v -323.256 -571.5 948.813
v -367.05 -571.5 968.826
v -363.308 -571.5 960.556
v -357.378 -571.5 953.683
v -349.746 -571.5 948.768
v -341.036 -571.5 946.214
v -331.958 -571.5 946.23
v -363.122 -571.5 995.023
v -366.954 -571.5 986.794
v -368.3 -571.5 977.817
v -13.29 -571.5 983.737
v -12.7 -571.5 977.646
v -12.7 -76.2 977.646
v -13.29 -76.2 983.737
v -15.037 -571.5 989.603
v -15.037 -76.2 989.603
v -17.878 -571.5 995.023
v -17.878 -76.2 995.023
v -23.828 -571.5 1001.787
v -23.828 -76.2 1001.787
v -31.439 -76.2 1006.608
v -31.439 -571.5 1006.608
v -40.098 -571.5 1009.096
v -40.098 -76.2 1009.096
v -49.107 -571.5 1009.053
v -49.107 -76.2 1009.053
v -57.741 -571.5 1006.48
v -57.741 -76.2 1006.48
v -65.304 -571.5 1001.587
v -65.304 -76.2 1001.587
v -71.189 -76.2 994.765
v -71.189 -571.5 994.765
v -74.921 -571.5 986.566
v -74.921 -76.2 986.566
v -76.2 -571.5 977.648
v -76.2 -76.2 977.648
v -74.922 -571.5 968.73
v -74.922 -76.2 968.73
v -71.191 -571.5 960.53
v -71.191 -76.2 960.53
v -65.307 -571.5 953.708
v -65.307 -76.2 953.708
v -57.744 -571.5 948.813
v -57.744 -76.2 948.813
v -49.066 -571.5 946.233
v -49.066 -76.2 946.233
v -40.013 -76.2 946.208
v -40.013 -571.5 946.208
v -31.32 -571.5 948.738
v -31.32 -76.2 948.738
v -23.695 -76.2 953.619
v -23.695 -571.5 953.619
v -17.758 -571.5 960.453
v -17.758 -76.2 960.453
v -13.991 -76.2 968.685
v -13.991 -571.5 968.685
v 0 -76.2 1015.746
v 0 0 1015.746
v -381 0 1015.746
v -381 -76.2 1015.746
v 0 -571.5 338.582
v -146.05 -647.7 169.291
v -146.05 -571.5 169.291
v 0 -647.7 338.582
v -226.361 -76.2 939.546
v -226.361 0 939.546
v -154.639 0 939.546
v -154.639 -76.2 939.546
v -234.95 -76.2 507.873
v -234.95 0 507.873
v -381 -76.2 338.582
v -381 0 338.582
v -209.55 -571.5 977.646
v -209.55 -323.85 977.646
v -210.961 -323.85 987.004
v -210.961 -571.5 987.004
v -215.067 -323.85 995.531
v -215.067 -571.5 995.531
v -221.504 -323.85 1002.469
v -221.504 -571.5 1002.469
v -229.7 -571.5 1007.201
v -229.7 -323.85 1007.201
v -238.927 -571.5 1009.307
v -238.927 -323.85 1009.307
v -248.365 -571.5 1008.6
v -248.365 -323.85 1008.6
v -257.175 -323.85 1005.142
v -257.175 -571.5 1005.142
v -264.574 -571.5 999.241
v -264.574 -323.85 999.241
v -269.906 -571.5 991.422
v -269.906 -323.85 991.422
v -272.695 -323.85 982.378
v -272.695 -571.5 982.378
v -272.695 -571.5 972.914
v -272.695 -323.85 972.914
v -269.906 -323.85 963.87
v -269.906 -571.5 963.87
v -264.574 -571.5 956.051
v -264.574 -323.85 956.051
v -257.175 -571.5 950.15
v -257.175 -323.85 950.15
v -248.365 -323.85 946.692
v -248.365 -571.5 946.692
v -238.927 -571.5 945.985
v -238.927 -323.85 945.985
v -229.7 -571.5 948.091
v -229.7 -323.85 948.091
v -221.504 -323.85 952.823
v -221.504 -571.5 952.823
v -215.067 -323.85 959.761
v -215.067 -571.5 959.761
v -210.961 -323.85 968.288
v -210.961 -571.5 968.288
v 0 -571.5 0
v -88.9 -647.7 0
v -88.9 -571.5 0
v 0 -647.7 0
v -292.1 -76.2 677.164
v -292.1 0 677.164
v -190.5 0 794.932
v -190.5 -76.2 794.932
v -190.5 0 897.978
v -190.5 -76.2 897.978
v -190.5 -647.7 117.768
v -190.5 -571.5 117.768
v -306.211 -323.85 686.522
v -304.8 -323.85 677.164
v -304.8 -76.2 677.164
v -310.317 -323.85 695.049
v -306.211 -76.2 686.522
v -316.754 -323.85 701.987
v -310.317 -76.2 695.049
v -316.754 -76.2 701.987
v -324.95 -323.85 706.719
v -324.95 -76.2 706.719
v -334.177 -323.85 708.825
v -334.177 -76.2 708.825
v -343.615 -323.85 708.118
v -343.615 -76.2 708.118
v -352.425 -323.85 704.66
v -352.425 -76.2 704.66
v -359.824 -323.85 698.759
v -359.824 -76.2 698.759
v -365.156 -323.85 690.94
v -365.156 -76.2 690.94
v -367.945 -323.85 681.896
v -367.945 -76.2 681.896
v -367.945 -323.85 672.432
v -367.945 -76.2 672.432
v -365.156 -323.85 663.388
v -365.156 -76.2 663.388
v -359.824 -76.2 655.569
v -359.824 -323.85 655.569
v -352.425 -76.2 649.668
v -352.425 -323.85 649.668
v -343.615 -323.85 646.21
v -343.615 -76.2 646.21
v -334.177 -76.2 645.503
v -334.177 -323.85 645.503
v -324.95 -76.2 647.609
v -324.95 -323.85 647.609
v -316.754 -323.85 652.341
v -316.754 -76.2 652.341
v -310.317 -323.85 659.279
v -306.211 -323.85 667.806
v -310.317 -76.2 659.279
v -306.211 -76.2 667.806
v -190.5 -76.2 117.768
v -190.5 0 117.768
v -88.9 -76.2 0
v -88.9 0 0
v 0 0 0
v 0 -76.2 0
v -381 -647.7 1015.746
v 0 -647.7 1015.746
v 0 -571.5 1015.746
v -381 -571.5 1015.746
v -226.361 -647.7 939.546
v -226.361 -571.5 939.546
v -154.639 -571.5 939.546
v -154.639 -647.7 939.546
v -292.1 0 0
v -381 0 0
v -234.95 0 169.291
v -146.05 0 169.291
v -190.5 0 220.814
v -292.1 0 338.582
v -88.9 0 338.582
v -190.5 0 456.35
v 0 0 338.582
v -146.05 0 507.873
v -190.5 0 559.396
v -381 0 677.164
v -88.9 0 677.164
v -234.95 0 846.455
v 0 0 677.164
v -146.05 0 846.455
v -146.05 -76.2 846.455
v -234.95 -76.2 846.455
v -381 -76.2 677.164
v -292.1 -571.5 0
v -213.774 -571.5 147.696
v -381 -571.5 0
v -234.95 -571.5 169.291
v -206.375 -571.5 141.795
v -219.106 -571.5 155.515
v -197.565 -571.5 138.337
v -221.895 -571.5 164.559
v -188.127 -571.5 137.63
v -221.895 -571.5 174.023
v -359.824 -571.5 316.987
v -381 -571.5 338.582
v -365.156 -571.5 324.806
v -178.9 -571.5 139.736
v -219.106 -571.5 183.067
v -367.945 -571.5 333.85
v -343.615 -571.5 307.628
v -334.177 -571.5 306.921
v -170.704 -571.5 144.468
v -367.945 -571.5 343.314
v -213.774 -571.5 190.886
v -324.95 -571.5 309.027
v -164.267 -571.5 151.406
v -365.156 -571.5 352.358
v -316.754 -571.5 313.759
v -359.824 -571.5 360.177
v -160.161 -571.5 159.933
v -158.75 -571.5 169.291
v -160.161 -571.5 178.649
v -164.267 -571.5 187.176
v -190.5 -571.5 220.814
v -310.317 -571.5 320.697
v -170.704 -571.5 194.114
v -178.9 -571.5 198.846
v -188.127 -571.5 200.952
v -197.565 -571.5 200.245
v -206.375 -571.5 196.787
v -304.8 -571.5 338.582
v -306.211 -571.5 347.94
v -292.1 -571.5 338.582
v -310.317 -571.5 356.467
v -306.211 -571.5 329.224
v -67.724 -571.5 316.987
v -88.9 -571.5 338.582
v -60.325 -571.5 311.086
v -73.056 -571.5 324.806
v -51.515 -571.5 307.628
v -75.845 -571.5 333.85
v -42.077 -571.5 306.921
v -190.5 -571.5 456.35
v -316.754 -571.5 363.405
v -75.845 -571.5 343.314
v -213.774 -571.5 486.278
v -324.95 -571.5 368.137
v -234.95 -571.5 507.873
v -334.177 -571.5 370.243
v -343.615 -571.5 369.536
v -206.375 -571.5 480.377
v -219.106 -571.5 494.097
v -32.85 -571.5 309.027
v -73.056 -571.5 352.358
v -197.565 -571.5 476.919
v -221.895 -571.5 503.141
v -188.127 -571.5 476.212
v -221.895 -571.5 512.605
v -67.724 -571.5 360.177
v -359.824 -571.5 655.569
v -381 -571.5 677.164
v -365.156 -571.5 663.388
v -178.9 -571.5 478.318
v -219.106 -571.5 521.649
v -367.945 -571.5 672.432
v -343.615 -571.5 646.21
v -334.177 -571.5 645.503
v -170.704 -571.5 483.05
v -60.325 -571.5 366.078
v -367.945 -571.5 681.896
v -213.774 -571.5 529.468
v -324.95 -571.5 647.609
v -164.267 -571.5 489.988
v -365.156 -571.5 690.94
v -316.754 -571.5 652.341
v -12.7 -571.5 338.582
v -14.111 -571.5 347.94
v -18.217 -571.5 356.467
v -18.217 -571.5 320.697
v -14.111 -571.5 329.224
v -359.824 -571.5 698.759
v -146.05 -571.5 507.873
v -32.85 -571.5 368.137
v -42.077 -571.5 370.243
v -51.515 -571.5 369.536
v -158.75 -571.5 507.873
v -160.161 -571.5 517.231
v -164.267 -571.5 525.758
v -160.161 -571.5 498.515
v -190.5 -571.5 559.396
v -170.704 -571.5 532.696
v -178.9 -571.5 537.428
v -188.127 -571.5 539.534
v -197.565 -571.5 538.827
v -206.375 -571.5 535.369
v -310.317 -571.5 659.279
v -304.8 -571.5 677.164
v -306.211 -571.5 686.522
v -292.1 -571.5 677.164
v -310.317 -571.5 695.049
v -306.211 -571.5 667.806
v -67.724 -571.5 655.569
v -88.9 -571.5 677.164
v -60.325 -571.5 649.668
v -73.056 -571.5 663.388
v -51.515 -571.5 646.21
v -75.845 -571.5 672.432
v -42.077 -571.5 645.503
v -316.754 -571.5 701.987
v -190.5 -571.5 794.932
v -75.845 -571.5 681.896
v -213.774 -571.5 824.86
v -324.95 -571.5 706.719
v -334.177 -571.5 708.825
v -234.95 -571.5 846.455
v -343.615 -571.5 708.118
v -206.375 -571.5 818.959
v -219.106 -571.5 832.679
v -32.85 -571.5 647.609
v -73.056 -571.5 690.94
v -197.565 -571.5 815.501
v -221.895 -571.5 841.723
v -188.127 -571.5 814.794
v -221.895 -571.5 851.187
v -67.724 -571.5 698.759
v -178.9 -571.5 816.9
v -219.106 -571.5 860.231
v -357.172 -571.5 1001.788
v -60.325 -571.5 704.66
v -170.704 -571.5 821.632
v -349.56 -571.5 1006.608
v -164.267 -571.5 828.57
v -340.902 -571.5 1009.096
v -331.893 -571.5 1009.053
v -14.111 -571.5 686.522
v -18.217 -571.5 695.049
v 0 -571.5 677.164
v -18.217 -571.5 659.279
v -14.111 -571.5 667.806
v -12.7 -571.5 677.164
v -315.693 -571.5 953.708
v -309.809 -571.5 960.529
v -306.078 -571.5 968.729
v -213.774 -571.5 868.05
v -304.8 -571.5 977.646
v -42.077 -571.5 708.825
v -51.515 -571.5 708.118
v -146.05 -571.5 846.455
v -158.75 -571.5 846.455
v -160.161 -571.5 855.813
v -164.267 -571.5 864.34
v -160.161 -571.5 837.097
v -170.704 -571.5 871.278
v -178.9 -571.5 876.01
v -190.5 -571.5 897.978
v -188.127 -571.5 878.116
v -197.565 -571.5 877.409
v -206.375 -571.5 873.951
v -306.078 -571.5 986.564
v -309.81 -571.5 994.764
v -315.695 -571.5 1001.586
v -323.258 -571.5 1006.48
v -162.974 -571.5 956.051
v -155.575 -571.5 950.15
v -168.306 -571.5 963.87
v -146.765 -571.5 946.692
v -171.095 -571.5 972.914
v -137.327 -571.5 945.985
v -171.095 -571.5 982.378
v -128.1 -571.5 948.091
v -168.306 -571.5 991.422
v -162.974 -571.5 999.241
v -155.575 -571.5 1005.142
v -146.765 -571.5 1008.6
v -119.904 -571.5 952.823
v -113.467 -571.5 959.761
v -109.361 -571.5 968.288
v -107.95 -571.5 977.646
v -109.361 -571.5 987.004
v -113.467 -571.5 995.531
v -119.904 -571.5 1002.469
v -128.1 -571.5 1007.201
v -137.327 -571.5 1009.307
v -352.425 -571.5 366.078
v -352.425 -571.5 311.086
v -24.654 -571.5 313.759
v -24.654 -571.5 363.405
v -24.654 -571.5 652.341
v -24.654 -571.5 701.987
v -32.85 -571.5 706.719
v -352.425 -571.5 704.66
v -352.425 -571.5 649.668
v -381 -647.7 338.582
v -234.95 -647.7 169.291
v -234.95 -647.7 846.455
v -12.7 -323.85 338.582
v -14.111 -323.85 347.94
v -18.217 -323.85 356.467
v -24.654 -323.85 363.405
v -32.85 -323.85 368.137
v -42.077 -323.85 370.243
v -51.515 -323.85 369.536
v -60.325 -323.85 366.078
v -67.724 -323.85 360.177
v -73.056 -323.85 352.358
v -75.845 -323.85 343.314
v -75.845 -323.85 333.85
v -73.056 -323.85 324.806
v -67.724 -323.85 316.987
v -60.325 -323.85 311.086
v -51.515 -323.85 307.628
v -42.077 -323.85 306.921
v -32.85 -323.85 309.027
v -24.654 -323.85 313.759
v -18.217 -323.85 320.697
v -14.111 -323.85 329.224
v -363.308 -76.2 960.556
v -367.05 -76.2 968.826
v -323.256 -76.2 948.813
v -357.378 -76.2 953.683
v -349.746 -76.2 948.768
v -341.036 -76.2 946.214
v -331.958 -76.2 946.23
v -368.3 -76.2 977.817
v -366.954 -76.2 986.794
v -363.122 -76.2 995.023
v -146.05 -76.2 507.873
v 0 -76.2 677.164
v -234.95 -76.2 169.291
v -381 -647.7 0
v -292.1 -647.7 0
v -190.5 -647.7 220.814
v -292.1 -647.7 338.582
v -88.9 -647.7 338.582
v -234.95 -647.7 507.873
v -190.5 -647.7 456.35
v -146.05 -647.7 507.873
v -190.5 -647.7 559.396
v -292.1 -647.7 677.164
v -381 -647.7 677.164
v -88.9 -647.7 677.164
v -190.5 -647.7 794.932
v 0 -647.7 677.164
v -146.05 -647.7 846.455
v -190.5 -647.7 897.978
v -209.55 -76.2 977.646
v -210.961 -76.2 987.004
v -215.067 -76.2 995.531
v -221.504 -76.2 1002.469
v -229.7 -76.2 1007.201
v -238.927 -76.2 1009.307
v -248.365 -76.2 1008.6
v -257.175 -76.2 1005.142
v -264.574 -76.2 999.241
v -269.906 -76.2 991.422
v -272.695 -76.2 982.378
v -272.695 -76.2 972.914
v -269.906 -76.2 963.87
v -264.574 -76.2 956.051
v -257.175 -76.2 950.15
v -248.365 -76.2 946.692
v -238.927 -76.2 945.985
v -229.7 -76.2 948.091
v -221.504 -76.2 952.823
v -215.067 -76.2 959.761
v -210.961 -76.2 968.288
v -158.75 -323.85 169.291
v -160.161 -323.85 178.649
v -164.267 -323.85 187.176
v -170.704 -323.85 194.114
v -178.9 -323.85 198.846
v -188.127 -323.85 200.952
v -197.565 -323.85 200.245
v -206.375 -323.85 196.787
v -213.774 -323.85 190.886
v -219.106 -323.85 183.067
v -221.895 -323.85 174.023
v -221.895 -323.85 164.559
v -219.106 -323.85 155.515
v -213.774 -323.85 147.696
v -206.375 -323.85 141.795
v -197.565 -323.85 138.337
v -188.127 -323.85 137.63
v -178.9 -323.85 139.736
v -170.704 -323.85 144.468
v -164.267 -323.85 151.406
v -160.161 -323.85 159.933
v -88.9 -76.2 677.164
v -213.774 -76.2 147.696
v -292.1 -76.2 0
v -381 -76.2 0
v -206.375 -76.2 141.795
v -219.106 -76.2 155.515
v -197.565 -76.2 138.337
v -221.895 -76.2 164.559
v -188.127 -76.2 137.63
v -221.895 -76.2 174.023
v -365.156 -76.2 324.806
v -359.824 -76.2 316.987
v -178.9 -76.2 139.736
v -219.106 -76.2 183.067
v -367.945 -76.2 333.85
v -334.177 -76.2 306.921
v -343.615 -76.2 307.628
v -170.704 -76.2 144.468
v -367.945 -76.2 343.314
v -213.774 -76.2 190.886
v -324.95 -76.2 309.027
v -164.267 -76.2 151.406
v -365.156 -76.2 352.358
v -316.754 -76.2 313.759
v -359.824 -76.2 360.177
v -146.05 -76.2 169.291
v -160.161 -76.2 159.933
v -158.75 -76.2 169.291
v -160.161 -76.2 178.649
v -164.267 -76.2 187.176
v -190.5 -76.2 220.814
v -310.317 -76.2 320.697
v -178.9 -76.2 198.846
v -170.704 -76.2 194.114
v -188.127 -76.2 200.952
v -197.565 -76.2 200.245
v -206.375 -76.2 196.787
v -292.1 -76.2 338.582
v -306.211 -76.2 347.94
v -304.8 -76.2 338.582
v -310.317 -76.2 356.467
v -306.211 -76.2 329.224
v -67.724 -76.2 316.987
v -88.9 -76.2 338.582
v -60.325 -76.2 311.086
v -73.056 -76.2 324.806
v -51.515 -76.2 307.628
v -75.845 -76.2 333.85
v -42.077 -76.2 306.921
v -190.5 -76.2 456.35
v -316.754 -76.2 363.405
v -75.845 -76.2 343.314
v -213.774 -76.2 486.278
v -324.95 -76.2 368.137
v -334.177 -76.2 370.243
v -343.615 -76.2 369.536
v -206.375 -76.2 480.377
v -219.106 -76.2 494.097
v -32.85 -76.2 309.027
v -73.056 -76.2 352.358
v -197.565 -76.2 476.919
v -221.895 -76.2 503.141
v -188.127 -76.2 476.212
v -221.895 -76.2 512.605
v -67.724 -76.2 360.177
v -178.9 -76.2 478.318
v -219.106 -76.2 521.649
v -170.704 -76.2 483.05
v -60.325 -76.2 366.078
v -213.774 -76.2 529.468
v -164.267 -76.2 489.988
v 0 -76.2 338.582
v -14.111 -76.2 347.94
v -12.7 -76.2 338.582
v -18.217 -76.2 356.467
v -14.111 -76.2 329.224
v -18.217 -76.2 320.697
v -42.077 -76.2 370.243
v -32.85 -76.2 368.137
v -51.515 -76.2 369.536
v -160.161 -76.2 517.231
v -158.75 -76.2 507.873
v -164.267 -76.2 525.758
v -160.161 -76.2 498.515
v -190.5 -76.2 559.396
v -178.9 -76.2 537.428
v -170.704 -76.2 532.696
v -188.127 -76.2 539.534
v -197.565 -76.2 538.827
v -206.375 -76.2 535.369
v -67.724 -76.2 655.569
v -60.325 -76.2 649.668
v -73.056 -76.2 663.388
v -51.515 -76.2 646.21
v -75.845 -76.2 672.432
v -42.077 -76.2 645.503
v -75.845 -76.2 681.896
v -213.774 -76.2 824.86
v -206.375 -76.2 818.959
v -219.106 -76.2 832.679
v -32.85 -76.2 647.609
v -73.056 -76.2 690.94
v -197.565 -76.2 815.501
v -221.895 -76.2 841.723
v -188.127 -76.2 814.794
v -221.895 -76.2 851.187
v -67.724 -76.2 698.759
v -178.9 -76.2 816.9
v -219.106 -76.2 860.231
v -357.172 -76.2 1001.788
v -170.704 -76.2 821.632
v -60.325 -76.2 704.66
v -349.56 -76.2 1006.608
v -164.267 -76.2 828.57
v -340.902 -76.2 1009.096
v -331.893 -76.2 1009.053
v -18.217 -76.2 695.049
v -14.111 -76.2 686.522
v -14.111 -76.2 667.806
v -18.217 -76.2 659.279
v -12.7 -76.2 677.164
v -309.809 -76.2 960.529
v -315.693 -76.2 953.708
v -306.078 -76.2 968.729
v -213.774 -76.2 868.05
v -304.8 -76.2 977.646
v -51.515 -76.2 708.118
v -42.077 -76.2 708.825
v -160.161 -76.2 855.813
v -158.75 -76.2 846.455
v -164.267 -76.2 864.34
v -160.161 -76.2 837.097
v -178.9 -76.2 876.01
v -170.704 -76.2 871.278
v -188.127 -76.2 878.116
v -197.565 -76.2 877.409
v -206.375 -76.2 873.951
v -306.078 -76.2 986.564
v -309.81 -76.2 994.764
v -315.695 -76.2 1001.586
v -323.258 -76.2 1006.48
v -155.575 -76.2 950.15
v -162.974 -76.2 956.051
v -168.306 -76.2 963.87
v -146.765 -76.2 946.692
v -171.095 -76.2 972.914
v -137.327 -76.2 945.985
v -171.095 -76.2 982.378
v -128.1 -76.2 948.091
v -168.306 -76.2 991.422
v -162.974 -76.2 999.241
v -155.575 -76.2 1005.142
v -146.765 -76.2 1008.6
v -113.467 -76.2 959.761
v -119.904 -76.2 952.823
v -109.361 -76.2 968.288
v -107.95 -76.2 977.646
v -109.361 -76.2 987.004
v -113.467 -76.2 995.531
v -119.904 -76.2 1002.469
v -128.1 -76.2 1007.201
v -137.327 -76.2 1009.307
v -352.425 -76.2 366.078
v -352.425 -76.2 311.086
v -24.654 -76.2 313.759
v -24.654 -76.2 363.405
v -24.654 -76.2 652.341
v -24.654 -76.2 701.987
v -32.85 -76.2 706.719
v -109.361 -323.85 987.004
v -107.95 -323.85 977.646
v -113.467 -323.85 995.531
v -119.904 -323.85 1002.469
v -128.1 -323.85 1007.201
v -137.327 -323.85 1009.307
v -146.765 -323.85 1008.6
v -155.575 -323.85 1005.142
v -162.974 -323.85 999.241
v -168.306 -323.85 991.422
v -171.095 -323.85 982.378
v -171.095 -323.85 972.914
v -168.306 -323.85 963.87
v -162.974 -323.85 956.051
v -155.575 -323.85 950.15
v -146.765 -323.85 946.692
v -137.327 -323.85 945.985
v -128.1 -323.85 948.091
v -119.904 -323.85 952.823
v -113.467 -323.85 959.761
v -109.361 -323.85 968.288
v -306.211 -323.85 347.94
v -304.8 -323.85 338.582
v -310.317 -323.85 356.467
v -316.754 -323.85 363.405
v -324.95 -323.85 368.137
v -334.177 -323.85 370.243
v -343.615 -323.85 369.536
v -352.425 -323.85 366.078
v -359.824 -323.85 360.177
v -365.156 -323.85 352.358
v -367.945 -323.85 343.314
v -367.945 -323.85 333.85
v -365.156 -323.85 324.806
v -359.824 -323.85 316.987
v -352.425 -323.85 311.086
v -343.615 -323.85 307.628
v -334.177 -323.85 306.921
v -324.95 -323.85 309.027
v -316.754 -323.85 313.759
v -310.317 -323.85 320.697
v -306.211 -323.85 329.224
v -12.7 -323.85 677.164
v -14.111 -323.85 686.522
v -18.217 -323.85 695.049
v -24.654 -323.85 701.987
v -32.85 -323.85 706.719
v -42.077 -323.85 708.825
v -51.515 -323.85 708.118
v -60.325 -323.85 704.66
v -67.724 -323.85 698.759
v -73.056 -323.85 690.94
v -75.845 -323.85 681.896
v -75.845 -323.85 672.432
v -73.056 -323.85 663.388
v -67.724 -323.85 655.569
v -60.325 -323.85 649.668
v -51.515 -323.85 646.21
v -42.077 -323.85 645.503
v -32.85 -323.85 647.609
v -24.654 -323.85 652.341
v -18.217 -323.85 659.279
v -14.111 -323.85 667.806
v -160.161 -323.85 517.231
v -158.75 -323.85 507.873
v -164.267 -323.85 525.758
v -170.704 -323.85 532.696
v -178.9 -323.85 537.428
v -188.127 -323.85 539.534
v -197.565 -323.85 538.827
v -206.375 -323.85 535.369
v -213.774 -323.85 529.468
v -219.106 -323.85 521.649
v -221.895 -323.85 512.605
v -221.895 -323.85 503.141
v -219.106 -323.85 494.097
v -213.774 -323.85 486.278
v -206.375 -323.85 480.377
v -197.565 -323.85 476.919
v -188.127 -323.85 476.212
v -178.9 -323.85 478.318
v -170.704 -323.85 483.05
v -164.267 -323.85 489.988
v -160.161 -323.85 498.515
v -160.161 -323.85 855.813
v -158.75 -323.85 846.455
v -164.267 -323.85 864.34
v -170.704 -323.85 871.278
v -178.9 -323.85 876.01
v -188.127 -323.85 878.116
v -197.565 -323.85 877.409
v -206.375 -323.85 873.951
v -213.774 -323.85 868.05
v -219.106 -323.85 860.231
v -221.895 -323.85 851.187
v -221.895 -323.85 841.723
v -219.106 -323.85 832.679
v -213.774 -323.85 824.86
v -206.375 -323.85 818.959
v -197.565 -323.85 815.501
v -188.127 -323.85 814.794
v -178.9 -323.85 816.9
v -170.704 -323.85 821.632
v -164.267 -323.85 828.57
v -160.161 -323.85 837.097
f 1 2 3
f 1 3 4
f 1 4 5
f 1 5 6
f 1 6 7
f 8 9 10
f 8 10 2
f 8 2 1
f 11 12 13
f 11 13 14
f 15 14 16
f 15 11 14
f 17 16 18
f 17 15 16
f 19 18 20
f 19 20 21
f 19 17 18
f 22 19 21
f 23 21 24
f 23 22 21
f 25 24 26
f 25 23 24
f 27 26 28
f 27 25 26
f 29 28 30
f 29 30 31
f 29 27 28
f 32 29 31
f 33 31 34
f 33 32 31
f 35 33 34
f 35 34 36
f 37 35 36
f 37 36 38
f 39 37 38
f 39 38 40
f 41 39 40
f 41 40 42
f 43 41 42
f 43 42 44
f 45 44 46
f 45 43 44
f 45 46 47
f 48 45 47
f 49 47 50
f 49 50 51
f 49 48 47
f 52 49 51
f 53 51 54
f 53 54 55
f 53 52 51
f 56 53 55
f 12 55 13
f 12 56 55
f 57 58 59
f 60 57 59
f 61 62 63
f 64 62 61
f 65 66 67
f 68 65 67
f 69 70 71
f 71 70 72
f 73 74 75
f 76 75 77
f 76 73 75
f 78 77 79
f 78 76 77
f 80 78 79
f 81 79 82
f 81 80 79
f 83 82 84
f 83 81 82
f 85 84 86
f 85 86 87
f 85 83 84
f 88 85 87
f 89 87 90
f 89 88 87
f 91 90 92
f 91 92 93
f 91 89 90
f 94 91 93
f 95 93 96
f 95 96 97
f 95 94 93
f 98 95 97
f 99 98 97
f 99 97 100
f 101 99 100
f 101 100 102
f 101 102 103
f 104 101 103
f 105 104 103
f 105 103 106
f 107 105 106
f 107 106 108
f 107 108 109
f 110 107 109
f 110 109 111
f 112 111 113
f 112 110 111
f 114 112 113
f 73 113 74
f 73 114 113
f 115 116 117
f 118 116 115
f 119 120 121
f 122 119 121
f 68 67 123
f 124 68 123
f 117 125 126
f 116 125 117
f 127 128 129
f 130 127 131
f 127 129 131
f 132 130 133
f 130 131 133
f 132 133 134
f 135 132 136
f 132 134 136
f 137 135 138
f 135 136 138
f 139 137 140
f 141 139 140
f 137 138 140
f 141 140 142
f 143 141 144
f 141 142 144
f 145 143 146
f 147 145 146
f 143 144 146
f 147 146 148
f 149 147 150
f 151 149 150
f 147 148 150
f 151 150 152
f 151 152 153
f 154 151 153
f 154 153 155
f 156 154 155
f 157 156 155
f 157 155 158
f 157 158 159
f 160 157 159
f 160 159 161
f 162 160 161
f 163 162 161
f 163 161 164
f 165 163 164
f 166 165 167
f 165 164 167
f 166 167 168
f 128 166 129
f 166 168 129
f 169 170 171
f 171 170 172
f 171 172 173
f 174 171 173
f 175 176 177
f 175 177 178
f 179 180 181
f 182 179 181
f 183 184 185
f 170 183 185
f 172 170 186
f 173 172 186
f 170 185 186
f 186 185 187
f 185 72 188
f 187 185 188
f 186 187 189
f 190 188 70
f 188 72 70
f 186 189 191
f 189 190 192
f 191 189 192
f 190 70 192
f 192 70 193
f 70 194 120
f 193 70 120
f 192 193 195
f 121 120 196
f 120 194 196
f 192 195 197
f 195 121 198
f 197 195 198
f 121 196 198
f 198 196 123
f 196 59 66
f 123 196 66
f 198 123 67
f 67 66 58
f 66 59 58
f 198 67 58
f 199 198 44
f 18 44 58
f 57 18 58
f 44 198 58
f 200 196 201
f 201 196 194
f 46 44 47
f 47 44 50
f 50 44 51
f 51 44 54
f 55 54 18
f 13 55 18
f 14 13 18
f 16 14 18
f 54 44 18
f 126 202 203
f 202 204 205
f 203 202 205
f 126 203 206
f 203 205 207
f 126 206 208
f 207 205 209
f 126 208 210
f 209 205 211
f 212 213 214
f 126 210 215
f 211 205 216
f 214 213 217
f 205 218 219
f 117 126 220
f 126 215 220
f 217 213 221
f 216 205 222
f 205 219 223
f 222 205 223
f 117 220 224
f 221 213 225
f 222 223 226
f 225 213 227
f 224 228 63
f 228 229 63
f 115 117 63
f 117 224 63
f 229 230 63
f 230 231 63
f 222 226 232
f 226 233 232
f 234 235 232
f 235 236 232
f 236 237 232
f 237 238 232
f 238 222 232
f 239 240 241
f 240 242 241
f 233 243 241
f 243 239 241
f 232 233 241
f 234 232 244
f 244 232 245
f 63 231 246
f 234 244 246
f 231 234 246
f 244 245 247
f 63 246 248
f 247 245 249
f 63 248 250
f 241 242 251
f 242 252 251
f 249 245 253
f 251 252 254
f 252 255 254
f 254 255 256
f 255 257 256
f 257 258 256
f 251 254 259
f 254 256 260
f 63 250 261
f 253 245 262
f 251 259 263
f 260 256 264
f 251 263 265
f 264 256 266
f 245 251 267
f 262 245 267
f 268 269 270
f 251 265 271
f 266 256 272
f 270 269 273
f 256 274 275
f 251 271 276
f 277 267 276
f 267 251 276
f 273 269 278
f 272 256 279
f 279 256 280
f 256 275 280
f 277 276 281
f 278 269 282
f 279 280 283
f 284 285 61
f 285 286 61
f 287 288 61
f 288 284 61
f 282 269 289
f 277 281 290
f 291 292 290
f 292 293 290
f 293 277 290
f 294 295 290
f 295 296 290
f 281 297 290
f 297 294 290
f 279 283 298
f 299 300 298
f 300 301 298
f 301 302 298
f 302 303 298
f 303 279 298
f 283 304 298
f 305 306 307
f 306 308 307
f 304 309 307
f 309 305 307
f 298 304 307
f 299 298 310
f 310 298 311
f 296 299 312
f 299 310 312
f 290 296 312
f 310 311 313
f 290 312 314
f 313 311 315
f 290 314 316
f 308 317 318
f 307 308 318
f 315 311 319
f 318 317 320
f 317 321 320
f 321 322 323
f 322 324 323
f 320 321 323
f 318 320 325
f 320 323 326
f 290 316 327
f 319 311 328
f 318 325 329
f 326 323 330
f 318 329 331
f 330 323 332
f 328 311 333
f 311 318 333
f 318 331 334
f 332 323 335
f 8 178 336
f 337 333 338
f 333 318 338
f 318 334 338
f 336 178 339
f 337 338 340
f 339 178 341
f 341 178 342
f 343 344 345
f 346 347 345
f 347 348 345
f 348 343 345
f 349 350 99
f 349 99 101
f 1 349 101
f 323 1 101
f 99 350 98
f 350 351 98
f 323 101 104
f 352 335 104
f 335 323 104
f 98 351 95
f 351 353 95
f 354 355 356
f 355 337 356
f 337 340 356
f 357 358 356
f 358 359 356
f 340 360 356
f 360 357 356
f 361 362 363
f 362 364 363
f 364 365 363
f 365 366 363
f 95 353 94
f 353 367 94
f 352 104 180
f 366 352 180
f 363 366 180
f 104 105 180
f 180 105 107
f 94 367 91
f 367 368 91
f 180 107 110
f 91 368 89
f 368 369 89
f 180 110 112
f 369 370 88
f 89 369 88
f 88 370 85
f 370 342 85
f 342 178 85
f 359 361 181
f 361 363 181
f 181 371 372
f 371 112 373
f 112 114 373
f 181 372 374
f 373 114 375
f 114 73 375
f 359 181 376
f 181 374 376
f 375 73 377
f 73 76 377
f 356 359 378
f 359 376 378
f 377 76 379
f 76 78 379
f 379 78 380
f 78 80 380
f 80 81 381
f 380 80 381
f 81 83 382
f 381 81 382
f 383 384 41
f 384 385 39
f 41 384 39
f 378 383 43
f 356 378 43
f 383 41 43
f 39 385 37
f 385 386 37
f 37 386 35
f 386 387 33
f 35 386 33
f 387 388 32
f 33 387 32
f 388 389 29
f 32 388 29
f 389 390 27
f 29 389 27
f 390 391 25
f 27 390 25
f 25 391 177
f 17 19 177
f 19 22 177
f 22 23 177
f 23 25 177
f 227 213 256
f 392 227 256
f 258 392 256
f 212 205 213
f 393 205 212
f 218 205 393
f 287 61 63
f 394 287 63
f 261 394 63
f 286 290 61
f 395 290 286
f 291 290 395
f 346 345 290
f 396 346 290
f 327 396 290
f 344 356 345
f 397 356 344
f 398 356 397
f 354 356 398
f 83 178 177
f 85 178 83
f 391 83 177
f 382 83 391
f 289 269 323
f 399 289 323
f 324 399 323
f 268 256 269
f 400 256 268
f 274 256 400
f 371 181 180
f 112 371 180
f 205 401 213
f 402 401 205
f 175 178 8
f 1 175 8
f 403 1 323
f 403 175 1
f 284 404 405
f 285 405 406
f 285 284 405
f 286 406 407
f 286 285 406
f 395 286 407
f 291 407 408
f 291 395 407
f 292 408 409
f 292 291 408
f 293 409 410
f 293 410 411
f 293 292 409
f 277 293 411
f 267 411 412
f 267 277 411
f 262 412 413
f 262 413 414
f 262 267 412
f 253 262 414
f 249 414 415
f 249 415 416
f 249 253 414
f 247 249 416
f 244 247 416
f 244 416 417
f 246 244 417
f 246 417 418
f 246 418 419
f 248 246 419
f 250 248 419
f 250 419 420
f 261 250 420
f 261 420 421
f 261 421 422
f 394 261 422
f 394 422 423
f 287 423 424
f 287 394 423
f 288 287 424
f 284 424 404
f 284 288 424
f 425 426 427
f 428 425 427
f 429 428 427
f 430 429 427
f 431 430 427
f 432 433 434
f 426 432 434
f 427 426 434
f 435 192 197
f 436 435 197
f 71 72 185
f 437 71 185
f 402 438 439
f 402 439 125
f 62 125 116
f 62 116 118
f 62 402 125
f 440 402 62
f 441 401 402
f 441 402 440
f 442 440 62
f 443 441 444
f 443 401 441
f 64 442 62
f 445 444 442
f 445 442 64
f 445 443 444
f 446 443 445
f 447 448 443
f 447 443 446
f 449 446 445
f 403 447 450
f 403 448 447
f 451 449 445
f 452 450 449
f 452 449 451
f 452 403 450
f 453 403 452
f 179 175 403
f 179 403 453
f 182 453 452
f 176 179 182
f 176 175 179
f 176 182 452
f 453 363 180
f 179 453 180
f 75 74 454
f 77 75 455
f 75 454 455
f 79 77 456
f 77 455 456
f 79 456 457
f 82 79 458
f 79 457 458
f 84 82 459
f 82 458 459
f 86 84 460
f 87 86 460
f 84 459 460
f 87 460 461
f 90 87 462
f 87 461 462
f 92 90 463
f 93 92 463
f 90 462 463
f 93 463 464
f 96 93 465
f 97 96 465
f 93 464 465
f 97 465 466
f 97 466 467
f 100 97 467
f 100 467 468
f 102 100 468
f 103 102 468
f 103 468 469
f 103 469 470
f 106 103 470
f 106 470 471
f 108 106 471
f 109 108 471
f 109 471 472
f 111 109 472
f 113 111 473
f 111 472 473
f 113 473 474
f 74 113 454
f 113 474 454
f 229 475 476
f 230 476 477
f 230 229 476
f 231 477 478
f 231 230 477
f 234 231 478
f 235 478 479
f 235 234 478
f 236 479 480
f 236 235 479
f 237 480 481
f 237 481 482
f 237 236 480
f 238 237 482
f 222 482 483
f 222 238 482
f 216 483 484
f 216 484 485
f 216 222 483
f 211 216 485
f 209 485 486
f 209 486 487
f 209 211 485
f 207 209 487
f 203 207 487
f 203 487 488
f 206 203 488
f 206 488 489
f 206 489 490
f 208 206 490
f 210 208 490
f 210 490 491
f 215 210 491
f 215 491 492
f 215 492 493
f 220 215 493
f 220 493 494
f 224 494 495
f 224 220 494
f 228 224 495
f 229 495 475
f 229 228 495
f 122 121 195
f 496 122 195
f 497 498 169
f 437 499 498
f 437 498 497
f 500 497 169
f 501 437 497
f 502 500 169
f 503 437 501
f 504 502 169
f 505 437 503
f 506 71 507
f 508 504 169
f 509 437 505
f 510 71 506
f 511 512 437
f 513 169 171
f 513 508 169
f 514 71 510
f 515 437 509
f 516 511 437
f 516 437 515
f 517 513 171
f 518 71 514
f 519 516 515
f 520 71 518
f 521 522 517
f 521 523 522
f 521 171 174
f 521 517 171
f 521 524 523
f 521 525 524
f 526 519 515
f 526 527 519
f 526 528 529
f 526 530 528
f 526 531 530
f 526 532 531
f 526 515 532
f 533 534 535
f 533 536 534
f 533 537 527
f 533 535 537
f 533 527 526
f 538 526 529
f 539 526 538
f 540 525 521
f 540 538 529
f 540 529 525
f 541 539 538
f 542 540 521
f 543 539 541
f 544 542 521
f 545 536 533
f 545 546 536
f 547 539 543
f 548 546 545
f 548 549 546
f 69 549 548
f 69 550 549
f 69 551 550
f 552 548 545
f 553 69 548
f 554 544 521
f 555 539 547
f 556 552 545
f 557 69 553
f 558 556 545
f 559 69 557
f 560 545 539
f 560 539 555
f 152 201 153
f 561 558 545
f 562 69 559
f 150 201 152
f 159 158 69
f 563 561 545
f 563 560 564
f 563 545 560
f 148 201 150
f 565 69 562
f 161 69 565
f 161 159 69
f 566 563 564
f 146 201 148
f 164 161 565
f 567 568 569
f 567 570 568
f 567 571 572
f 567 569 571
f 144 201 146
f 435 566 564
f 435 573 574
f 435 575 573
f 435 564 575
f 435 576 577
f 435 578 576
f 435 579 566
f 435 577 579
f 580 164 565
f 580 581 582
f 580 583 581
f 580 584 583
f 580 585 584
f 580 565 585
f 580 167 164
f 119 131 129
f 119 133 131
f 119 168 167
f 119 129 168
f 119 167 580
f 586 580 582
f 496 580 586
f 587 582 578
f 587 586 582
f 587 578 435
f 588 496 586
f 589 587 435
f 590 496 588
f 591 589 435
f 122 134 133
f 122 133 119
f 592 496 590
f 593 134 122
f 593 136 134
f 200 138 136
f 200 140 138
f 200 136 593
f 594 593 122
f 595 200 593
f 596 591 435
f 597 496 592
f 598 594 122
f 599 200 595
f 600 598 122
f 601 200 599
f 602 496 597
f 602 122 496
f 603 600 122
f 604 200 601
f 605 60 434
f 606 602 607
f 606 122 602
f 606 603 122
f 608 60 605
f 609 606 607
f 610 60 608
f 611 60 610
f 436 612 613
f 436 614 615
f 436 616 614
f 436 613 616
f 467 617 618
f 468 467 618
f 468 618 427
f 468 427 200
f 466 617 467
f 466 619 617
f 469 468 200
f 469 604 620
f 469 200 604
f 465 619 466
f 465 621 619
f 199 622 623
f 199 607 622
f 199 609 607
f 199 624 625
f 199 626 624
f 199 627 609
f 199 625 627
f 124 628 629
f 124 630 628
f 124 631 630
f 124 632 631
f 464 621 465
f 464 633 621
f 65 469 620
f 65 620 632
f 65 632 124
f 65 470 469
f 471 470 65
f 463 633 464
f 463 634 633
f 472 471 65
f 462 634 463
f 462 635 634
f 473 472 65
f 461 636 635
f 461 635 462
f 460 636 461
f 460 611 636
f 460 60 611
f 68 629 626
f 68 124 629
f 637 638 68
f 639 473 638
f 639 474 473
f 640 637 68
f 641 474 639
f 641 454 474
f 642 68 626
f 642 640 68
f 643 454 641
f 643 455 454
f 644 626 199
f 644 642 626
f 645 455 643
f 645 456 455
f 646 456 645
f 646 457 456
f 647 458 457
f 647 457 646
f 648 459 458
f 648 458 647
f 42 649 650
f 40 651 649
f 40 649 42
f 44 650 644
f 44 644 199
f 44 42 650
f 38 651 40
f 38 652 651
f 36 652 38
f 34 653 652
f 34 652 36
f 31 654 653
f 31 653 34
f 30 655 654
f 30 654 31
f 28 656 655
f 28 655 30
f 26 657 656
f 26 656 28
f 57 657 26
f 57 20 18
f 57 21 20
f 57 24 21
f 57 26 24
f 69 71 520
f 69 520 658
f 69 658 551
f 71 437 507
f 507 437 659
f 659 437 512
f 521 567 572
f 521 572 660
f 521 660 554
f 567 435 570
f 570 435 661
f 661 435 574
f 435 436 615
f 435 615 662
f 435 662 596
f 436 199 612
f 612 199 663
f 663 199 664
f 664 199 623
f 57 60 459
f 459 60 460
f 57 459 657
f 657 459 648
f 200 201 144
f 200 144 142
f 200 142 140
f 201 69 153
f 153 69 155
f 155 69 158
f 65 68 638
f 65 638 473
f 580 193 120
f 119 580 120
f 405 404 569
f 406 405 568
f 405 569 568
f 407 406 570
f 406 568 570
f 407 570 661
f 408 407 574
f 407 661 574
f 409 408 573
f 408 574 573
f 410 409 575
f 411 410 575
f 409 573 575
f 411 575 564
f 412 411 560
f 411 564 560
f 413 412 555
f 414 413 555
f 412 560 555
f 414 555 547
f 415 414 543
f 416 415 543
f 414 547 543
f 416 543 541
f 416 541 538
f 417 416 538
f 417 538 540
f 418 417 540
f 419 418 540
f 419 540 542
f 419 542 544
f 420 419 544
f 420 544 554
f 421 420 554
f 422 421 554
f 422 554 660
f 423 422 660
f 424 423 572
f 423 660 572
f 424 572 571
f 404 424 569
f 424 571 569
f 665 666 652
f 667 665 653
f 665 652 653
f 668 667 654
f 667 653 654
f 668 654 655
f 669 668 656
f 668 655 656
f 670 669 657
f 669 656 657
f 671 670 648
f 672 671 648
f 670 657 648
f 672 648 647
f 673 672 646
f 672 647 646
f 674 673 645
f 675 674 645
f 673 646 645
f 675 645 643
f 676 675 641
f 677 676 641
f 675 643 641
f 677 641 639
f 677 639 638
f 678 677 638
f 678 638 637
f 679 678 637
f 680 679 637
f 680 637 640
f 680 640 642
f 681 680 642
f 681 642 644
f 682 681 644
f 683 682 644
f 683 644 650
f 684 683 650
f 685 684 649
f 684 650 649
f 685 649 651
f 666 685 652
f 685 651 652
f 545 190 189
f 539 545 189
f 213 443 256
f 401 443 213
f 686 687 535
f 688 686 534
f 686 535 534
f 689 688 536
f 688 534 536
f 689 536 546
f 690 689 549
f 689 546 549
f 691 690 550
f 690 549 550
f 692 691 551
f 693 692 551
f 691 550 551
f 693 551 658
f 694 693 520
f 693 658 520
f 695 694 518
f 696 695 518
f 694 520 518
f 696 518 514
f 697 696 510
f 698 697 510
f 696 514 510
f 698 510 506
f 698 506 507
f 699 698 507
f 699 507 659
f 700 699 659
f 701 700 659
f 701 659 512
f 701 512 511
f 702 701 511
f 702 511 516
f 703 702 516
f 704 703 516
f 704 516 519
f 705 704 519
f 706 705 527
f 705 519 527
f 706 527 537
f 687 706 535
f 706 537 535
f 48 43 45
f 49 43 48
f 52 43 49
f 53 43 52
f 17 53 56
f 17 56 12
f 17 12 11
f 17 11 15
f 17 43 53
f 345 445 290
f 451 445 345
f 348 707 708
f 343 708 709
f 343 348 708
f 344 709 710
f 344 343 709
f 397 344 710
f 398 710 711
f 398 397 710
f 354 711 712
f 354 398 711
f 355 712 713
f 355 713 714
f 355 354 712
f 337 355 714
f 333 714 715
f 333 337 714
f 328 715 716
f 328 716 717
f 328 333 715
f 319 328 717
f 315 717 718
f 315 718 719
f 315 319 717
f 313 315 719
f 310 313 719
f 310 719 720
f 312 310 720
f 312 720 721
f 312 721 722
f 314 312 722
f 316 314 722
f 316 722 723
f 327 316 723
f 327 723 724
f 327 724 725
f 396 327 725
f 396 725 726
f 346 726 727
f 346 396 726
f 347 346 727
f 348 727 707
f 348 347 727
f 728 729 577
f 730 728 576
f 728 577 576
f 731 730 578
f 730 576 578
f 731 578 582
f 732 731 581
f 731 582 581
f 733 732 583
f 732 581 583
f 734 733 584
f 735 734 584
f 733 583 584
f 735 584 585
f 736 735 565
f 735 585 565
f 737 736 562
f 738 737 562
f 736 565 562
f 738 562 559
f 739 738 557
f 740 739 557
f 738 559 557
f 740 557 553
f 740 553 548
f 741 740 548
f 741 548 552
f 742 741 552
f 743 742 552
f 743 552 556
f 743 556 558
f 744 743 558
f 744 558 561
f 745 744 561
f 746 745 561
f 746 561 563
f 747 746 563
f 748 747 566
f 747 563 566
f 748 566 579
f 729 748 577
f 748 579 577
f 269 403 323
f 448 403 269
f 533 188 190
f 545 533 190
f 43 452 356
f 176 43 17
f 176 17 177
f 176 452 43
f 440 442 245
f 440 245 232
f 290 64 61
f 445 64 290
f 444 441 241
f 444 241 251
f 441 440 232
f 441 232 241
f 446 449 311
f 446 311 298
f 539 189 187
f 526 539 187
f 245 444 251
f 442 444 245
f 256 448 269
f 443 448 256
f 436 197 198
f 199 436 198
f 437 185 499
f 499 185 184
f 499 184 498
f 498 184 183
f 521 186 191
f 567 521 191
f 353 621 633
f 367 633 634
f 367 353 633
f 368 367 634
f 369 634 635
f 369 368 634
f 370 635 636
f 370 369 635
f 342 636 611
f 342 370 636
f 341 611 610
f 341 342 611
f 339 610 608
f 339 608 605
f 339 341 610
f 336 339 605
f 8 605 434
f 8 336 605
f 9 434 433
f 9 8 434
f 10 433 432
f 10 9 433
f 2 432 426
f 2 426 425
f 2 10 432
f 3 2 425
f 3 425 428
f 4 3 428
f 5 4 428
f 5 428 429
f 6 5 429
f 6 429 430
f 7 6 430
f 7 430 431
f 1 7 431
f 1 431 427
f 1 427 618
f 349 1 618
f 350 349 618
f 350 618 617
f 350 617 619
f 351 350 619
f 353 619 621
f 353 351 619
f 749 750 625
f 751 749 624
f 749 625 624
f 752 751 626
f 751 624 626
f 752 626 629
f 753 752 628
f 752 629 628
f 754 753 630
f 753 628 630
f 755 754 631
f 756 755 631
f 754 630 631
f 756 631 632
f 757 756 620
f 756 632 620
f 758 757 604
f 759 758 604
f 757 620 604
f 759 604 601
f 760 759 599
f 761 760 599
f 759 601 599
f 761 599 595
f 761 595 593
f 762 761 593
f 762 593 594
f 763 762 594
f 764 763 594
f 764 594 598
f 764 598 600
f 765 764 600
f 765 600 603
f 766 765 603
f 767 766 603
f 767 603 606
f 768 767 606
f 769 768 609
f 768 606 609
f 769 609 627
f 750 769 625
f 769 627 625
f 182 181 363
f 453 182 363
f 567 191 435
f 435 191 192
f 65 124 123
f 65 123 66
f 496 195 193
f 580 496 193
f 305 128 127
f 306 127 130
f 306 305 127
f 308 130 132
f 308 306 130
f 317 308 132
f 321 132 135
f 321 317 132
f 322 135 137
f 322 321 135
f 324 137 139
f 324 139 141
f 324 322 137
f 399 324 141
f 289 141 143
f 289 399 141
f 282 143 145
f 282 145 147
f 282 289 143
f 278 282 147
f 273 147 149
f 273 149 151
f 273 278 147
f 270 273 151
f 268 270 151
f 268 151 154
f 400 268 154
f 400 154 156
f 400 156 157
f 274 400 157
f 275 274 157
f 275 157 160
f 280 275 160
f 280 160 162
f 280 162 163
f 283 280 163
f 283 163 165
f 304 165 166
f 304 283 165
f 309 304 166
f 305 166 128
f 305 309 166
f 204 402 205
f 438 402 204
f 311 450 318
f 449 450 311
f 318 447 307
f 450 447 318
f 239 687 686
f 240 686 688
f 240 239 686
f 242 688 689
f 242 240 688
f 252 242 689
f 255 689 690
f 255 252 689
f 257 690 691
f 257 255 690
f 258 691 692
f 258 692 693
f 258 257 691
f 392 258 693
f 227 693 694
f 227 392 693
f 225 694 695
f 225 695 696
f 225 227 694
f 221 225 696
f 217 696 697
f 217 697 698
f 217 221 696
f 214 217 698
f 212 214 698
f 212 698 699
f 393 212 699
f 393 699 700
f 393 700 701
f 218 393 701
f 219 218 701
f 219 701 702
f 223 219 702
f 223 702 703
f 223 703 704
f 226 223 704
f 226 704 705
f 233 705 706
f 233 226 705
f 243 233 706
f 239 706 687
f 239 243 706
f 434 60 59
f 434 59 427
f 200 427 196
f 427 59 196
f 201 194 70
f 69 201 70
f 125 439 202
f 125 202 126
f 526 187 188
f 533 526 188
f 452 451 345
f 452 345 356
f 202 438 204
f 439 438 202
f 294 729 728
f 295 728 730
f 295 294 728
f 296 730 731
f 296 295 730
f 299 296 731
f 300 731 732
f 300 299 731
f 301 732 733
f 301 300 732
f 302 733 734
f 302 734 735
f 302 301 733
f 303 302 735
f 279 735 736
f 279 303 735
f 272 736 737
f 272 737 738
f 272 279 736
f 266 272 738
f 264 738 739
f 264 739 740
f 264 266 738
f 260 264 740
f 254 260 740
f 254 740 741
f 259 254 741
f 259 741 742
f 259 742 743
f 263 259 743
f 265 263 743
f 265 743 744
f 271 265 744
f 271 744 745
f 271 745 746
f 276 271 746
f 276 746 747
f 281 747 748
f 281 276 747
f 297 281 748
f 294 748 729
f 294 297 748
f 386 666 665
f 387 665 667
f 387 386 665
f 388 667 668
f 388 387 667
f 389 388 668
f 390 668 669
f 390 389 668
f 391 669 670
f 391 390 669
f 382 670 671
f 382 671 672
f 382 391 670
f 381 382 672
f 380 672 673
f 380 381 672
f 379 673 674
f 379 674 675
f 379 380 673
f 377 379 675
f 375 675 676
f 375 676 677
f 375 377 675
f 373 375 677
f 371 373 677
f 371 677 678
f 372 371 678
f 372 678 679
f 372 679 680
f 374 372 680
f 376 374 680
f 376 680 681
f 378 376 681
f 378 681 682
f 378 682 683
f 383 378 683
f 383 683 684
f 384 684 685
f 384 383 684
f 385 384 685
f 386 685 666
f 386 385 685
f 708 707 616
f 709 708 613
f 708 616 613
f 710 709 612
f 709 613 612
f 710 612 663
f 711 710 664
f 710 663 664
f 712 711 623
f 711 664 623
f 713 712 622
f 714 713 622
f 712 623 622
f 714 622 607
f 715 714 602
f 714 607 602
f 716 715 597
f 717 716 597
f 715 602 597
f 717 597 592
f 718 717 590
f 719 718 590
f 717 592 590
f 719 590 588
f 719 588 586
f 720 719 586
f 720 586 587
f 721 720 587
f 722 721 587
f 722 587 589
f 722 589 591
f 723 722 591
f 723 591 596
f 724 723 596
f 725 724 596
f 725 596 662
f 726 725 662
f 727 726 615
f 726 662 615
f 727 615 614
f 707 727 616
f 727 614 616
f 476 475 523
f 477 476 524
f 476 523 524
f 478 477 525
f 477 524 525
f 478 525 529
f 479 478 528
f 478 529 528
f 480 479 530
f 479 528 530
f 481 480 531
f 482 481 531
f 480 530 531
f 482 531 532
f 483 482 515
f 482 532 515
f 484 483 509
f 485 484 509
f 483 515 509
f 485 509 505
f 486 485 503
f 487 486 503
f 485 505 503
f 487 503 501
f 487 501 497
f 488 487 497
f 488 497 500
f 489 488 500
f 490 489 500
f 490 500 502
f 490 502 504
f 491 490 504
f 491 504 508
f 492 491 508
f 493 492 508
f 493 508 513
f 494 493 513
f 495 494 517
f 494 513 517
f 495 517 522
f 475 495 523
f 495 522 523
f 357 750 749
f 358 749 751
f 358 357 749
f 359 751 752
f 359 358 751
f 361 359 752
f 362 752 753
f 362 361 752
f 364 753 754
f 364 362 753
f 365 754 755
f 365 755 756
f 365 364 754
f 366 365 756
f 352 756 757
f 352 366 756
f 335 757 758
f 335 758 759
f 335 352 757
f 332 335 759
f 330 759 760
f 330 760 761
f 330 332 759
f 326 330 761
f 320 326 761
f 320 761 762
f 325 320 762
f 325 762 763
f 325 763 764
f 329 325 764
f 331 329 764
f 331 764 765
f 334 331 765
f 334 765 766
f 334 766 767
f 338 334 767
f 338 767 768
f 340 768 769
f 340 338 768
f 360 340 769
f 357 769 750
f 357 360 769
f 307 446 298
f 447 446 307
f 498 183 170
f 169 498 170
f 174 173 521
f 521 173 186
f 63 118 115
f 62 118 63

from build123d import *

# Parameters (mm, degrees)
F1_DEPTH = 76.2
F2_R     = 31.75
F3_DEPTH = 247.65


# Not quite as in the source:
# - a feature names something its author has since deleted; it is built from what else it names


with BuildPart() as f1:
    # F0 (on Front) → F1 (new body)
    with BuildSketch(Plane.XZ):
        Polygon((-234.95, 507.873), (-190.5, 559.3963478261), (-292.1, 677.164), (-381, 677.164), align=None)
        Polygon((-190.5, 456.3496521739), (-146.05, 507.873), (-190.5, 559.3963478261), (-234.95, 507.873), align=None)
        Polygon((-190.5, 559.3963478261), (-146.05, 507.873), (0, 677.164), (-88.9, 677.164), align=None)
        Polygon((-88.9, 338.582), (0, 338.582), (-146.05, 507.873), (-190.5, 456.3496521739), align=None)
        Polygon((-381, 338.582), (-292.1, 338.582), (-190.5, 456.3496521739), (-234.95, 507.873), align=None)
        Polygon((-234.95, 169.291), (-190.5, 220.8143478261), (-292.1, 338.582), (-381, 338.582), align=None)
        Polygon((-190.5, 220.8143478261), (-146.05, 169.291), (0, 338.582), (-88.9, 338.582), align=None)
        Polygon((-190.5, 117.7676521739), (-146.05, 169.291), (-190.5, 220.8143478261), (-234.95, 169.291), align=None)
        Polygon((-88.9, 0), (0, 0), (-146.05, 169.291), (-190.5, 117.7676521739), align=None)
        Polygon((-292.1, 0), (-190.5, 117.7676521739), (-234.95, 169.291), (-381, 0), align=None)
        Polygon((-381, 677.164), (-292.1, 677.164), (-190.5, 794.9316521739), (-234.95, 846.455), align=None)
        Polygon((-190.5, 794.9316521739), (-146.05, 846.455), (-190.5, 897.9783478261), (-234.95, 846.455), align=None)
        Polygon((-88.9, 677.164), (0, 677.164), (-146.05, 846.455), (-190.5, 794.9316521739), align=None)
        Polygon((-190.5, 897.9783478261), (-146.05, 846.455), (0, 1015.746), (-88.9, 1015.746), (-154.6389347337, 939.546), align=None)
        Polygon((-154.6389347337, 939.546), (-88.9, 1015.746), (-292.1, 1015.746), (-226.3610652663, 939.546), align=None)
        Polygon((-234.95, 846.455), (-190.5, 897.9783478261), (-226.3610652663, 939.546), (-292.1, 1015.746), (-381, 1015.746), align=None)
    extrude(amount=F1_DEPTH)

    # F2 (on face) → F3 (join)
    with BuildSketch(Plane.XZ.offset(76.2)):
        with Locations((-336.55, 677.164)):
            Circle(F2_R)
        with Locations((-44.45, 677.164)):
            Circle(F2_R)
        with Locations((-190.5, 507.873)):
            Circle(F2_R)
        with Locations((-190.5, 169.291)):
            Circle(F2_R)
        with Locations((-44.45, 338.582)):
            Circle(F2_R)
        with Locations((-336.55, 338.582)):
            Circle(F2_R)
        with Locations((-190.5, 846.455)):
            Circle(F2_R)
        with Locations((-44.45, 977.646)):
            Circle(F2_R)
        with Locations((-139.7, 977.646)):
            Circle(F2_R)
        with Locations((-336.55, 977.646)):
            Circle(F2_R)
        with Locations((-241.3, 977.646)):
            Circle(F2_R)
    extrude(amount=F3_DEPTH)

    # F4: F1 across face


with BuildPart() as f1_1:
    add(f1.part)
    add(f1.part.mirror(Plane(origin=(-336.55, -323.85, 977.646), x_dir=(1, 0, 0), z_dir=(0, -1, 0))))


solid = f1_1.part
